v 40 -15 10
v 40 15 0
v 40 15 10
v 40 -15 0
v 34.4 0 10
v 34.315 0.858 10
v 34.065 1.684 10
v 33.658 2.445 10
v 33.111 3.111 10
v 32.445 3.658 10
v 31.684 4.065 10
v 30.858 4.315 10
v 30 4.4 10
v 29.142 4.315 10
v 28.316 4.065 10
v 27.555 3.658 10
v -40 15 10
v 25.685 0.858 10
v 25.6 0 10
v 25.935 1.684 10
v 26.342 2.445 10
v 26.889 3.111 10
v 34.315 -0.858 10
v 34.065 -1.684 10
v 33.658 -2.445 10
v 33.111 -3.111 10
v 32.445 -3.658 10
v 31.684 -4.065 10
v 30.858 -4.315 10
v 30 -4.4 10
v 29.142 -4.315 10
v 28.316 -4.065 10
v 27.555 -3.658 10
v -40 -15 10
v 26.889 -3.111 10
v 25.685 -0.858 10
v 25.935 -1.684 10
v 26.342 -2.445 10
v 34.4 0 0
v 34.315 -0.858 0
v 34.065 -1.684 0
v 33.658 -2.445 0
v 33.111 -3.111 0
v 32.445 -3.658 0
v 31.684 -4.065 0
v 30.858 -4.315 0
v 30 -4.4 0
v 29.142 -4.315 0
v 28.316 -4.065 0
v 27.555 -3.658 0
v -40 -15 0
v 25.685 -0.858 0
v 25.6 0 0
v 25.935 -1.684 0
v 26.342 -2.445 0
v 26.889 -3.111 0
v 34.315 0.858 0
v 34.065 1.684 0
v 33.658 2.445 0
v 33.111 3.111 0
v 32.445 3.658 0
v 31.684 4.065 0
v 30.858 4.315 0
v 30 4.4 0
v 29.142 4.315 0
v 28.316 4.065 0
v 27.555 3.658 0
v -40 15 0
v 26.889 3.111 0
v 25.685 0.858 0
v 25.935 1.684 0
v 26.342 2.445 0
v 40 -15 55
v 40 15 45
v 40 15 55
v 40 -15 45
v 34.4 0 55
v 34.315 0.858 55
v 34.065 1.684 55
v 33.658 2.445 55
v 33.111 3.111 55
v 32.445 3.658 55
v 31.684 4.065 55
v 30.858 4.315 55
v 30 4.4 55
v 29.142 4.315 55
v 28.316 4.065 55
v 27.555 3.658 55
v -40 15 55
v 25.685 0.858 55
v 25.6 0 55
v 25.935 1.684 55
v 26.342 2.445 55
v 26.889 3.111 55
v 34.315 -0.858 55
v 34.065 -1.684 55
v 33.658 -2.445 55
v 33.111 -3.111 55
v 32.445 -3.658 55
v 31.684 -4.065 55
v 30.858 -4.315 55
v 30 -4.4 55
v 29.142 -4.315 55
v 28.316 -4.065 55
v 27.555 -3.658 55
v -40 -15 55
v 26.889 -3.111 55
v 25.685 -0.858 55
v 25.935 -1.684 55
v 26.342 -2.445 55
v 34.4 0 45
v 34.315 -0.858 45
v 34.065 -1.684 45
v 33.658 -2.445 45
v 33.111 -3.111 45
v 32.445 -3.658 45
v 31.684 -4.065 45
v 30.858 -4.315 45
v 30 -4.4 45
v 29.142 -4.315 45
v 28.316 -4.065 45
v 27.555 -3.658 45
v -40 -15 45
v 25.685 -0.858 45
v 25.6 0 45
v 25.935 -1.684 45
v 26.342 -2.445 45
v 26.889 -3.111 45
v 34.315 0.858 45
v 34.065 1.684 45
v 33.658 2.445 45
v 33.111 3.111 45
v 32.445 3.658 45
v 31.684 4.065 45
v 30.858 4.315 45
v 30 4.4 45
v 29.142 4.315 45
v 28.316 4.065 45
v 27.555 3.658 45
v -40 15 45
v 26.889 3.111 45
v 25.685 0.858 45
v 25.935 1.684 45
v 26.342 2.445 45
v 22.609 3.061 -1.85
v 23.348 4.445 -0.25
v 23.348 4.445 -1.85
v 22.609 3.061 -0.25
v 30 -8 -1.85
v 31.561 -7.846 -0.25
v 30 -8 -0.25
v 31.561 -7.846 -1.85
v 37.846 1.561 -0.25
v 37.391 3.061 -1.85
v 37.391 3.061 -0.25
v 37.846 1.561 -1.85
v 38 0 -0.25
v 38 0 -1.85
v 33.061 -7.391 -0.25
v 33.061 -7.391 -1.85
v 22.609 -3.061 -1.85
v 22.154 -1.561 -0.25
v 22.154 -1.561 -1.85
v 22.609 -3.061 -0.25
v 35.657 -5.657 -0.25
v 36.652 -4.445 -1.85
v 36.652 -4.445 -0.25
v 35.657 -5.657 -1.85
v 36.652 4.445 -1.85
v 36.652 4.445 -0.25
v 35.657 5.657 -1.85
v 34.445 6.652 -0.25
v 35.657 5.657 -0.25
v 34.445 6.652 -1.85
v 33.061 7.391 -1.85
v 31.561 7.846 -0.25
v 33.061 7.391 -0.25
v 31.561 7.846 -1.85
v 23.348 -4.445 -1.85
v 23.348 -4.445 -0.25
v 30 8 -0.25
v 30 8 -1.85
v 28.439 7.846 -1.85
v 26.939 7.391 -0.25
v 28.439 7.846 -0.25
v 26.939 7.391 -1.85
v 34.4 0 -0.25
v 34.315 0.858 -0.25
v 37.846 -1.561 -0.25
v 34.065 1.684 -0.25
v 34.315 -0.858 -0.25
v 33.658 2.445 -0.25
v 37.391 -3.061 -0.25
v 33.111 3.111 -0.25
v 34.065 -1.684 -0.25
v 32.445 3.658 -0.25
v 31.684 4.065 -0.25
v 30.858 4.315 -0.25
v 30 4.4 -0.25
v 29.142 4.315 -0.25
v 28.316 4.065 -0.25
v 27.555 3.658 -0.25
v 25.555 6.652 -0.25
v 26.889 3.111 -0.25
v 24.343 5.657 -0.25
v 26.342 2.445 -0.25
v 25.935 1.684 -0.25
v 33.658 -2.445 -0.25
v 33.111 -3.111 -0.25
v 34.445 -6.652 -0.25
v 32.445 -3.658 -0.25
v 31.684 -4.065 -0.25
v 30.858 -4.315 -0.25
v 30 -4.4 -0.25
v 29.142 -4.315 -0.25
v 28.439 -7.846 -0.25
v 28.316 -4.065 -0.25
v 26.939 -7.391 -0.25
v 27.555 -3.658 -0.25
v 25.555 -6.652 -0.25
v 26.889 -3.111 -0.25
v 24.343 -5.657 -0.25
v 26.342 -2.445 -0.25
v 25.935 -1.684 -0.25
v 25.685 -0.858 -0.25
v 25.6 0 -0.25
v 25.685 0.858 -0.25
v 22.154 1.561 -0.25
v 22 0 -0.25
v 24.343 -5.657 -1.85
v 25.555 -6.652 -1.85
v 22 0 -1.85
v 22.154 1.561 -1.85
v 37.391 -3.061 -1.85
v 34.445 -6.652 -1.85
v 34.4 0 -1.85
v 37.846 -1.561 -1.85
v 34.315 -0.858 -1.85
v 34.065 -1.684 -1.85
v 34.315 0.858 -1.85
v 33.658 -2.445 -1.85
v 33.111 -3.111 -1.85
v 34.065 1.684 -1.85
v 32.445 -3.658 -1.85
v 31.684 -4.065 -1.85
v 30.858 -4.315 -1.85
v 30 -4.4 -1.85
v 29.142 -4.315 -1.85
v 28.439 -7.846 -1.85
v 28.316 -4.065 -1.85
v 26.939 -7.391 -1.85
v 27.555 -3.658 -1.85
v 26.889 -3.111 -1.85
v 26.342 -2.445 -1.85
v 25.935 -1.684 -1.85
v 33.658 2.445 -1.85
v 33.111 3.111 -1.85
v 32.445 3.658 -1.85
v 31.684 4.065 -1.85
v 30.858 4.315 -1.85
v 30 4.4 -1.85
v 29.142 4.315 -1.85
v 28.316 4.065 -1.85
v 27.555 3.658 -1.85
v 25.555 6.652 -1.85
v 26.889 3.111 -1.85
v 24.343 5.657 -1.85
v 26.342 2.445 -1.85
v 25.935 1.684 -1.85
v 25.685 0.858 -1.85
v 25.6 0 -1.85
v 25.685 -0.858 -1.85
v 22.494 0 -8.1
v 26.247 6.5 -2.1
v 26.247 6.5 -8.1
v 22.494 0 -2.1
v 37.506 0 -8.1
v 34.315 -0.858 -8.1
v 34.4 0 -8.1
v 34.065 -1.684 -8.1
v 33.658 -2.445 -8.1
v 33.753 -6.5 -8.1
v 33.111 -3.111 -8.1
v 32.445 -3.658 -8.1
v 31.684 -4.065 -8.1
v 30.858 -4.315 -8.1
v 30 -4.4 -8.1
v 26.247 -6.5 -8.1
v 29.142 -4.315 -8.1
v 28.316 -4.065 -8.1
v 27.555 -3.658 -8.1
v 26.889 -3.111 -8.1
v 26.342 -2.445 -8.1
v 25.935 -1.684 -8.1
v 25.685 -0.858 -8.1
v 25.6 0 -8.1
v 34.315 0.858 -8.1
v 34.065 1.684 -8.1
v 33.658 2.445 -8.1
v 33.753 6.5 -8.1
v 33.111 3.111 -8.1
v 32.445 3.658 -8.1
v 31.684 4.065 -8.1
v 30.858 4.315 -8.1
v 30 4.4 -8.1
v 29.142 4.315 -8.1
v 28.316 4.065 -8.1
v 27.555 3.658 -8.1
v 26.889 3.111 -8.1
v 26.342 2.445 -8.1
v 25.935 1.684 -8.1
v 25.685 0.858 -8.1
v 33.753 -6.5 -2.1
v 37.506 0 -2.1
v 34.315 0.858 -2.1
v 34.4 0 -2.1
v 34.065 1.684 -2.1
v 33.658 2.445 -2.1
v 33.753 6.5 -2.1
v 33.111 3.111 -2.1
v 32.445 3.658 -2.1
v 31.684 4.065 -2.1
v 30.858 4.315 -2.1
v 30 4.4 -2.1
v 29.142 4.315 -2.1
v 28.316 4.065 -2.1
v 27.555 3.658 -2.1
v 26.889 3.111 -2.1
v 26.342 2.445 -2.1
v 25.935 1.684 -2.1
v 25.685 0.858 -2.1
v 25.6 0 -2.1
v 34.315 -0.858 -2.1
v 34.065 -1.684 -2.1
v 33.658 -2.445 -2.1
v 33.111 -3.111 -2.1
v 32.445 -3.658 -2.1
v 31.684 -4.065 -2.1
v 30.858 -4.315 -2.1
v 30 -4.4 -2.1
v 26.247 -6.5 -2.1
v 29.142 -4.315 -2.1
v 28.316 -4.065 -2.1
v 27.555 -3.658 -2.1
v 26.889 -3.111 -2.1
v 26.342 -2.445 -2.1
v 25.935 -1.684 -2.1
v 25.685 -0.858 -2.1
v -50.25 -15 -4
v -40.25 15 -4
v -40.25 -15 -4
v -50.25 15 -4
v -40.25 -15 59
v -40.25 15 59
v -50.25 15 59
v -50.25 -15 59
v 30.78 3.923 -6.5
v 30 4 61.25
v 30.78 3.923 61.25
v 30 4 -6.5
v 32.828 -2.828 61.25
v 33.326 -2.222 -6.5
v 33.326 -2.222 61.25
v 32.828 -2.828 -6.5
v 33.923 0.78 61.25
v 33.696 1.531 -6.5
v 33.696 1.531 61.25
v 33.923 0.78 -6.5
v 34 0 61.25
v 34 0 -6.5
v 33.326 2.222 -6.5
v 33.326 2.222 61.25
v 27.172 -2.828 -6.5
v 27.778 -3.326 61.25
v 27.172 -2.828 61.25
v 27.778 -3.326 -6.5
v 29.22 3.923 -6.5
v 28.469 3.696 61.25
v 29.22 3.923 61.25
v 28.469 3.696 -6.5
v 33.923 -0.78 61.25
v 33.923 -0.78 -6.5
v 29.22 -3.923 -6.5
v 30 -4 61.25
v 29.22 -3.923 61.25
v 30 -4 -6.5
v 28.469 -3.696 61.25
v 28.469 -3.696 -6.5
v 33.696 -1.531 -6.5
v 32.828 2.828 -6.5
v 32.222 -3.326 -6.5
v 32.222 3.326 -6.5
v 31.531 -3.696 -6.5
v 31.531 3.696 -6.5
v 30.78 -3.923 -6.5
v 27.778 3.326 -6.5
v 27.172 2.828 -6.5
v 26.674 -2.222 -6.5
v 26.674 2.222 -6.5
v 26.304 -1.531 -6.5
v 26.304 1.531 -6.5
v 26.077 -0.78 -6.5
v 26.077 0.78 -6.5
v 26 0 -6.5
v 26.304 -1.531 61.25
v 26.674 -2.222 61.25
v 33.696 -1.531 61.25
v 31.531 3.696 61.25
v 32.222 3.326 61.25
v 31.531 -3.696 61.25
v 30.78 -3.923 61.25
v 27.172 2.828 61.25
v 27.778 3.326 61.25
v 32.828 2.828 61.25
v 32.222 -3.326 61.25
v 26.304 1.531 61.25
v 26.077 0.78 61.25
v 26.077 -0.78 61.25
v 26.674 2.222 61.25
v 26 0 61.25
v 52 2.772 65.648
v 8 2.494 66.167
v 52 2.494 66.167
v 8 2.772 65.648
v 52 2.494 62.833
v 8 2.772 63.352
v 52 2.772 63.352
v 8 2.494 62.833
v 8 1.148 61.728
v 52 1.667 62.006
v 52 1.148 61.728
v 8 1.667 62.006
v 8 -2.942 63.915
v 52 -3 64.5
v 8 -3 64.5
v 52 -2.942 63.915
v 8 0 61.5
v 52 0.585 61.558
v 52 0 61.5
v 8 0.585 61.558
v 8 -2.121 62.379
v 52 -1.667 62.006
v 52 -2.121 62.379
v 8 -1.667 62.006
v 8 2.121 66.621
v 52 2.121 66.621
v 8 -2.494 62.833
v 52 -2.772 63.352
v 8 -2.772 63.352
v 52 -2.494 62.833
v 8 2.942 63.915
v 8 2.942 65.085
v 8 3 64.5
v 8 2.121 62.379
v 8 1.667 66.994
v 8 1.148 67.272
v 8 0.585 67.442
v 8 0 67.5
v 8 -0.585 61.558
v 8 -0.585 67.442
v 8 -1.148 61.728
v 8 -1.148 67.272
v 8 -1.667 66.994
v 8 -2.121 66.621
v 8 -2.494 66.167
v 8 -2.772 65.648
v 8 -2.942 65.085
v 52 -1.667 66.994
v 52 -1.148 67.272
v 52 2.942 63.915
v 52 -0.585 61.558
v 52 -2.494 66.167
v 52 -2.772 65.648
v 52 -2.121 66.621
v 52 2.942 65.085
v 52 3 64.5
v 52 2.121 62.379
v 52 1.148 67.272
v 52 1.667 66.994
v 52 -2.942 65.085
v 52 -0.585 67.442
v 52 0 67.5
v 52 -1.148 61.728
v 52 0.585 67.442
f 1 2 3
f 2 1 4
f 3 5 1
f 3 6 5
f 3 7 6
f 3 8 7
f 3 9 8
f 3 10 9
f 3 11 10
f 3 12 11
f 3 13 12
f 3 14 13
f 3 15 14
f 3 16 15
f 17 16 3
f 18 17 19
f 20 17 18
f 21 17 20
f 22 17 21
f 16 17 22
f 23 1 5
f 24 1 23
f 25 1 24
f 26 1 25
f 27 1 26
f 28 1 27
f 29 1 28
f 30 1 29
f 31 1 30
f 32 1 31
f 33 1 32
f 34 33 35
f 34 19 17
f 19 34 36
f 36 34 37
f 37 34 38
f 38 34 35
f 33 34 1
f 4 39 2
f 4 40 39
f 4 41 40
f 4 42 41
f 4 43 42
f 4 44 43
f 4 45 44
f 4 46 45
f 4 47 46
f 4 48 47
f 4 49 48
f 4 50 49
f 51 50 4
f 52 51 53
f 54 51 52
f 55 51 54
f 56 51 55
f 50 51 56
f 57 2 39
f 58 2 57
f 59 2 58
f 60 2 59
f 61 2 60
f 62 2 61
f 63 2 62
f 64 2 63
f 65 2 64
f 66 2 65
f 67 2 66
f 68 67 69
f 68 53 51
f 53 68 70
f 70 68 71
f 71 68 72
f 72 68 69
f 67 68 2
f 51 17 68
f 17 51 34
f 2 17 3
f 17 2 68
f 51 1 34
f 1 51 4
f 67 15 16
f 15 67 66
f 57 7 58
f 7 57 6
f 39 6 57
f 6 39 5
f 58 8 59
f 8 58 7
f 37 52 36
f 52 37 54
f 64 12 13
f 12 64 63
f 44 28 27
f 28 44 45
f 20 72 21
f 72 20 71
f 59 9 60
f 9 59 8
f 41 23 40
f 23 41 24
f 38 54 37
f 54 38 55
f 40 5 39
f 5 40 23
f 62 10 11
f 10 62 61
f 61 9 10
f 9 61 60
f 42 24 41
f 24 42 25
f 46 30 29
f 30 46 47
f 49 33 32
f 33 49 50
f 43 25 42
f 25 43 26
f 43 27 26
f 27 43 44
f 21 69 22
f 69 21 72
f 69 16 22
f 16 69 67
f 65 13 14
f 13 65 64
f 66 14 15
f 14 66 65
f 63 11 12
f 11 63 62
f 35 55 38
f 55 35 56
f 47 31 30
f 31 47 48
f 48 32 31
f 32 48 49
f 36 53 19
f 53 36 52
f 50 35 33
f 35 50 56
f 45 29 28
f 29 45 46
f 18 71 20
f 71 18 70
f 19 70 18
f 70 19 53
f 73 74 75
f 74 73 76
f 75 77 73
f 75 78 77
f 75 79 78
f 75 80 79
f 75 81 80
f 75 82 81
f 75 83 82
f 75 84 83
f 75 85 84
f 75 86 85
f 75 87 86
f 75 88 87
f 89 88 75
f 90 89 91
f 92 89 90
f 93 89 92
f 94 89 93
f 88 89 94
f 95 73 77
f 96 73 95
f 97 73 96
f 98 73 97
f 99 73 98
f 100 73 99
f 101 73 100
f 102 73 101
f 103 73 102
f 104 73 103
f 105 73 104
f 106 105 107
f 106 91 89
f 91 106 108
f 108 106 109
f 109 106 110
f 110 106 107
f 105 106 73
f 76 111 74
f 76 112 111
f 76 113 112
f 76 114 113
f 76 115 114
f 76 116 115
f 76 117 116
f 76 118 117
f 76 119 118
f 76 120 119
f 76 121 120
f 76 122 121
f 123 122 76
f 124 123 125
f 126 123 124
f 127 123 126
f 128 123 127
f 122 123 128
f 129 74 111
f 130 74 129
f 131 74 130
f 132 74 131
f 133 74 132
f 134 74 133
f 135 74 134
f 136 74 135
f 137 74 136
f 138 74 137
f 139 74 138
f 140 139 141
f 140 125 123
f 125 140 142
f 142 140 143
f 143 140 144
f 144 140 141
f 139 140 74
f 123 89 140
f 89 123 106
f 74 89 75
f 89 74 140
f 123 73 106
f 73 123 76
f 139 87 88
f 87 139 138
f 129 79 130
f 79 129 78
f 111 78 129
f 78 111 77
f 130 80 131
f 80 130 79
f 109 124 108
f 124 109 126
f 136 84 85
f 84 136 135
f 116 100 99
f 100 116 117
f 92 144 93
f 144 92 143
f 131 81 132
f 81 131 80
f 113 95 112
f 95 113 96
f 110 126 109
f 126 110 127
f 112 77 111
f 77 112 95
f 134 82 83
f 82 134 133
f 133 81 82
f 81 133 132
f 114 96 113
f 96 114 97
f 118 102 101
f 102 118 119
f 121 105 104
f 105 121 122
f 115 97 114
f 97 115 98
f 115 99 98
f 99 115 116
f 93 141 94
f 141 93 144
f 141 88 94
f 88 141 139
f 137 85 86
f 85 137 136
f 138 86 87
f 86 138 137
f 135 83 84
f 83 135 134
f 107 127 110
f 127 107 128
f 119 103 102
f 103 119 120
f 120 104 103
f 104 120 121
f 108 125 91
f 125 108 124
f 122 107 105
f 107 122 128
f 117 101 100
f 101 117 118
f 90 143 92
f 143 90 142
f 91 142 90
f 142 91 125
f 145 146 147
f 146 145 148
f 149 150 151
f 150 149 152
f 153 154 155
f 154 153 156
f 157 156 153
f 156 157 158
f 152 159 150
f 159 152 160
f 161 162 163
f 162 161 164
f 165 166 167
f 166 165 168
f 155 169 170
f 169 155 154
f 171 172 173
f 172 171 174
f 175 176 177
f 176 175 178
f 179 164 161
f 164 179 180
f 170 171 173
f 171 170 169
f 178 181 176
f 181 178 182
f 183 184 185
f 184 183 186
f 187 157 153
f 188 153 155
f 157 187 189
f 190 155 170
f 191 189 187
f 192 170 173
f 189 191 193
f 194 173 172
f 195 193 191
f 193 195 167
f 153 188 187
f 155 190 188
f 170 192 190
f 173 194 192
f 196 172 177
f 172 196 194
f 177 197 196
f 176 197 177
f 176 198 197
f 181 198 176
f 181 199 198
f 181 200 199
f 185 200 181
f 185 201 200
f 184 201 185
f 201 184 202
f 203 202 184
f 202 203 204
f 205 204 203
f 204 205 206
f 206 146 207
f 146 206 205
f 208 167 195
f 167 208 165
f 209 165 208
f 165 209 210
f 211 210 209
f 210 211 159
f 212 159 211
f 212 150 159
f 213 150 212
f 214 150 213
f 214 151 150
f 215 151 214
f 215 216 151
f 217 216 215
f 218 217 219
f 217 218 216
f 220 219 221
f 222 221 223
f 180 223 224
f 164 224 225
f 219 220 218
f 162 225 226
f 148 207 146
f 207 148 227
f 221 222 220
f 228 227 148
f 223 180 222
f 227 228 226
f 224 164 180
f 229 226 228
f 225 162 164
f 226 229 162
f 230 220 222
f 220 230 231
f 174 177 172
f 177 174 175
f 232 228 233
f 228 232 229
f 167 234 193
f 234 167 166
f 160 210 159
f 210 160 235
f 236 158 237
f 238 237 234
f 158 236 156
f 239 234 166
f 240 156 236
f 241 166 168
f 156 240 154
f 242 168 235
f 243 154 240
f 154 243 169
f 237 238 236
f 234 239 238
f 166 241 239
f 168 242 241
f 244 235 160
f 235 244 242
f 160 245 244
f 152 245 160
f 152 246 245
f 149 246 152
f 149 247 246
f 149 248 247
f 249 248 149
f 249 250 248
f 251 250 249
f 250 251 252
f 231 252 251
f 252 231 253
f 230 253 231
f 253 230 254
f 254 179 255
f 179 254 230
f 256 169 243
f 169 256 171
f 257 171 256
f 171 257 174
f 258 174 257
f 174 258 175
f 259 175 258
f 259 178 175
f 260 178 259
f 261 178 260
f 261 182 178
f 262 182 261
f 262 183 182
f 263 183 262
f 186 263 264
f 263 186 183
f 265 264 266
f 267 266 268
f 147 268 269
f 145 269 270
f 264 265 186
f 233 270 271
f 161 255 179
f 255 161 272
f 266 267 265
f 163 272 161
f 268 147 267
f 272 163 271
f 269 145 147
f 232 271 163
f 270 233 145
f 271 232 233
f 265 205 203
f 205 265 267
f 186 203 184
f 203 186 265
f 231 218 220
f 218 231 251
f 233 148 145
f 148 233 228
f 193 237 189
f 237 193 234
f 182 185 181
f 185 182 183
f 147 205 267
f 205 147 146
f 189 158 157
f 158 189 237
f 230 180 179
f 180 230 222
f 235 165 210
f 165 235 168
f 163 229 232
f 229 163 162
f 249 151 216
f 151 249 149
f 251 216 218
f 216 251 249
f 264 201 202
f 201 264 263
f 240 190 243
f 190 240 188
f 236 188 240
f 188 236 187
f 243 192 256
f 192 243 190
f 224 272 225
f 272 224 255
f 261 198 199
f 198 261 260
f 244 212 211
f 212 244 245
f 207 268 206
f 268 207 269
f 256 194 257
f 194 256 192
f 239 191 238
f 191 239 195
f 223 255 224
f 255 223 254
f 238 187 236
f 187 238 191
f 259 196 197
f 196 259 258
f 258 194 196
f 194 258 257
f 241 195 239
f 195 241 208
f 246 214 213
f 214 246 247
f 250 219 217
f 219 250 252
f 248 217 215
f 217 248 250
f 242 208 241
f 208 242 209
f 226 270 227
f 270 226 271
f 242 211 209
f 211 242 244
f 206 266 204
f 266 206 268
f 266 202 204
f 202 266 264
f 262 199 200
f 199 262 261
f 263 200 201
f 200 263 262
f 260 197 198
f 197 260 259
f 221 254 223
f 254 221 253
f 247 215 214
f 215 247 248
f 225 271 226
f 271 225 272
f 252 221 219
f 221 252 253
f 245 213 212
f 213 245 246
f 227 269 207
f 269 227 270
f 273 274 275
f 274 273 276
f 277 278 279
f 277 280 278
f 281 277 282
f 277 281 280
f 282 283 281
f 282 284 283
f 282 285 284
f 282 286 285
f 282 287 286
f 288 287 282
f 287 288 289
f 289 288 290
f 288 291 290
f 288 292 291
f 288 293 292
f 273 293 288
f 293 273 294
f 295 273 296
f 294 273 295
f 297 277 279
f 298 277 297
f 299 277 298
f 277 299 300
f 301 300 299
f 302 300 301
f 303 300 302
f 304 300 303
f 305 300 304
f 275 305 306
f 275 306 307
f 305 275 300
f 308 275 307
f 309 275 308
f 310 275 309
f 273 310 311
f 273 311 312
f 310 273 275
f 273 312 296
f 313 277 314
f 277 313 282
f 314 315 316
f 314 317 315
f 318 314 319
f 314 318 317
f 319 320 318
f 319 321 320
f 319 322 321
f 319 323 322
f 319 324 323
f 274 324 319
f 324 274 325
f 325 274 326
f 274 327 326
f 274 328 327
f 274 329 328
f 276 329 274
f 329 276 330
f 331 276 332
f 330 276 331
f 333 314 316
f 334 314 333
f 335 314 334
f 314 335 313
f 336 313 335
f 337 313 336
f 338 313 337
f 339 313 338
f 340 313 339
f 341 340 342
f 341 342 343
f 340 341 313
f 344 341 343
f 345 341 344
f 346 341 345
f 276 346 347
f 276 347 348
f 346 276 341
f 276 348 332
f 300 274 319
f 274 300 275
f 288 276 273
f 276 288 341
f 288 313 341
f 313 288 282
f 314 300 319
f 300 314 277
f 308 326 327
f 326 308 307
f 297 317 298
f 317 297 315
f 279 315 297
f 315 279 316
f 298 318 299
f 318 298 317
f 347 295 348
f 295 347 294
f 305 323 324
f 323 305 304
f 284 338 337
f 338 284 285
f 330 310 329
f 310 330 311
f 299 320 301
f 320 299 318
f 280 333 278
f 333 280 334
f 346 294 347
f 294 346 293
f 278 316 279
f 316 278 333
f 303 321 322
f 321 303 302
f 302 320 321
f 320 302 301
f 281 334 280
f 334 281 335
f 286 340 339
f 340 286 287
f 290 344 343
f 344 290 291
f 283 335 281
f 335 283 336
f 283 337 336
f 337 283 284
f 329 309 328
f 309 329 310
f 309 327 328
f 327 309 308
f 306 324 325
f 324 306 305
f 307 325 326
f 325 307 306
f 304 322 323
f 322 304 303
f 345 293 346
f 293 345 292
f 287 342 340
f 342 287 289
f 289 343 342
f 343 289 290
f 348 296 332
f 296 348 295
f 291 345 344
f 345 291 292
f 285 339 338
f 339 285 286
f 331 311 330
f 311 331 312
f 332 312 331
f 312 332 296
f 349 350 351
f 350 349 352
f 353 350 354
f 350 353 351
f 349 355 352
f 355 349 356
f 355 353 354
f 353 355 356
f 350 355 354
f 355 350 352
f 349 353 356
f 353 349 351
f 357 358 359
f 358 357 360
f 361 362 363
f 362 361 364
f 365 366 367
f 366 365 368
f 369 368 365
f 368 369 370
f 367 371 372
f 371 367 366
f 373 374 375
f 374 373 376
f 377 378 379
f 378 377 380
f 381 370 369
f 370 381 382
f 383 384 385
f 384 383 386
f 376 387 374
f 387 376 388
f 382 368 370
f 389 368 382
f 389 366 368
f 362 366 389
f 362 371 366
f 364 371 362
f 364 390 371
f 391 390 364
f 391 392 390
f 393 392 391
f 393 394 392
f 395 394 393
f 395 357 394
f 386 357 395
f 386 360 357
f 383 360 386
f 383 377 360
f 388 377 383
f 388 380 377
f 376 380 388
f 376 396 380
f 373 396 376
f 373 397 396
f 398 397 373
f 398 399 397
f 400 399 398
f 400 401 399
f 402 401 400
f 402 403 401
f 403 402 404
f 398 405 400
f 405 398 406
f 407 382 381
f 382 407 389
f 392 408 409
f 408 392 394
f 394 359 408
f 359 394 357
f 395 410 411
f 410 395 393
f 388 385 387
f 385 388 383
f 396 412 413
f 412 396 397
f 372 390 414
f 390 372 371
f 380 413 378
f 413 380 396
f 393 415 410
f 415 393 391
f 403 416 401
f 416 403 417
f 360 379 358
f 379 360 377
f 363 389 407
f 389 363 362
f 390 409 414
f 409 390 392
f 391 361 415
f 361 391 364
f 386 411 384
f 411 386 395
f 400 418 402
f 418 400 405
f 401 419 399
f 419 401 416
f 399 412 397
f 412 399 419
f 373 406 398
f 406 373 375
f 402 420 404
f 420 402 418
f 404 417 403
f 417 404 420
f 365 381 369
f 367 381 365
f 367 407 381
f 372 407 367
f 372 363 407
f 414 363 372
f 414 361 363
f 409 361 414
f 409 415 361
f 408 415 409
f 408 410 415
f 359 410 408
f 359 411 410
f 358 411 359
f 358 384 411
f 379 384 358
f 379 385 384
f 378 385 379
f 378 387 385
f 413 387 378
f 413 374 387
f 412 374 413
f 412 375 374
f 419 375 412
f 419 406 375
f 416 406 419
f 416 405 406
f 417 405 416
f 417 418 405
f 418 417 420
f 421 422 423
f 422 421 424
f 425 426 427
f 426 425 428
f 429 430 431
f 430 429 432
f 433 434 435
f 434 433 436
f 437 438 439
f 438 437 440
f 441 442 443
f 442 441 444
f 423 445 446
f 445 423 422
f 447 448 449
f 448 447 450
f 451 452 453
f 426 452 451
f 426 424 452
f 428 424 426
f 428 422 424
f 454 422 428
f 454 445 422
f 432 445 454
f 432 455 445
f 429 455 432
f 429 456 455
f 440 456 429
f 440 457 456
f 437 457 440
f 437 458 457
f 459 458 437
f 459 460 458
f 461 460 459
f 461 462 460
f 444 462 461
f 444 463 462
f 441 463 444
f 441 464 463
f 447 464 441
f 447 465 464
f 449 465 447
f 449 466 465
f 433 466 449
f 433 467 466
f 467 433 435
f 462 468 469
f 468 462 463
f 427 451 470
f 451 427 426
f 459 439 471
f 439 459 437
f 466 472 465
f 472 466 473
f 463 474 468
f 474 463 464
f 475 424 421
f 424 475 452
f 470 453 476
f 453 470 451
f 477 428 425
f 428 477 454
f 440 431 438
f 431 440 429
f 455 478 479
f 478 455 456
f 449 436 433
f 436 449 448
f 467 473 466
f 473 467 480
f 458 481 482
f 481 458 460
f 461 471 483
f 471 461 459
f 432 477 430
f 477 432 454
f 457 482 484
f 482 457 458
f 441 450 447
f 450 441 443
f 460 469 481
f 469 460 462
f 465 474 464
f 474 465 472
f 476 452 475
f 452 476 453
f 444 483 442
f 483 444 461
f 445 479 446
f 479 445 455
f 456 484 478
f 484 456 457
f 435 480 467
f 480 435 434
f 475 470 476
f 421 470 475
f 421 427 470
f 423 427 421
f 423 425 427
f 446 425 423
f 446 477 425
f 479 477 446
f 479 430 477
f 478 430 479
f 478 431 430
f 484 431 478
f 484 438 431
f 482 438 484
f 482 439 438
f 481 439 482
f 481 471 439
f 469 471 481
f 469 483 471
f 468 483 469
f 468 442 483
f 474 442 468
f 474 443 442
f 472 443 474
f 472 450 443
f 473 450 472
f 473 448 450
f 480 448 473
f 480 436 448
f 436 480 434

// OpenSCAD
$fn = 32;

// ------------------------------------------------------------------------
// C clamp: throat 45 mm, screw d8
// Every part is its own module, assembly() places every instance.
// ------------------------------------------------------------------------

// --- part 1 ---
module clamp_arm() {
  difference() {
    translate([-40, -15, 0]) cube([80, 30, 10]);
    translate([30, 0, -1]) cylinder(h = 12, d = 8.8);
  }
}

// --- part 2 ---
module clamp_spine() {
  difference() {
    translate([-31.5, -15, 0]) cube([63, 30, 10]);
  }
}

// --- part 3 ---
module clamp_screw() {
  translate([0, 0, -33.875]) cylinder(h = 67.75, d = 8);
}

// --- part 4 ---
module clamp_washer() {
  difference() {
      translate([0, 0, 0]) cylinder(h = 1.6, d = 16);
      translate([0, 0, -1]) cylinder(h = 3.6, d = 8.8);
    }
}

// --- part 5 ---
module clamp_nut() {
  difference() {
    linear_extrude(height = 6) polygon(points = [[7.506, 0], [3.753, 6.5], [-3.753, 6.5], [-7.506, 0], [-3.753, -6.5], [3.753, -6.5]]);
    translate([0, 0, -1]) cylinder(h = 8, d = 8.8);
  }
}

// --- part 6 ---
module tommy_bar() {
  translate([0, 0, -22]) cylinder(h = 44, d = 6);
}

// --- assembly ---
module assembly() {
  color([0.80, 0.24, 0.20]) translate([0, 0, 0]) rotate([0, 0, 0]) clamp_arm();
  color([0.20, 0.45, 0.75]) translate([0, 0, 45]) rotate([0, 0, 0]) clamp_arm();
  color([0.25, 0.62, 0.32]) translate([-50.25, 0, 27.5]) rotate([0, 90, 0]) clamp_spine();
  color([0.92, 0.70, 0.18]) translate([30, 0, 27.375]) rotate([0, 0, 0]) clamp_screw();
  color([0.58, 0.35, 0.70]) translate([30, 0, -1.85]) rotate([0, 0, 0]) clamp_washer();
  color([0.16, 0.66, 0.66]) translate([30, 0, -8.1]) rotate([0, 0, 0]) clamp_nut();
  color([0.85, 0.48, 0.18]) translate([30, 0, 64.5]) rotate([0, 90, 0]) tommy_bar();
}

assembly();
